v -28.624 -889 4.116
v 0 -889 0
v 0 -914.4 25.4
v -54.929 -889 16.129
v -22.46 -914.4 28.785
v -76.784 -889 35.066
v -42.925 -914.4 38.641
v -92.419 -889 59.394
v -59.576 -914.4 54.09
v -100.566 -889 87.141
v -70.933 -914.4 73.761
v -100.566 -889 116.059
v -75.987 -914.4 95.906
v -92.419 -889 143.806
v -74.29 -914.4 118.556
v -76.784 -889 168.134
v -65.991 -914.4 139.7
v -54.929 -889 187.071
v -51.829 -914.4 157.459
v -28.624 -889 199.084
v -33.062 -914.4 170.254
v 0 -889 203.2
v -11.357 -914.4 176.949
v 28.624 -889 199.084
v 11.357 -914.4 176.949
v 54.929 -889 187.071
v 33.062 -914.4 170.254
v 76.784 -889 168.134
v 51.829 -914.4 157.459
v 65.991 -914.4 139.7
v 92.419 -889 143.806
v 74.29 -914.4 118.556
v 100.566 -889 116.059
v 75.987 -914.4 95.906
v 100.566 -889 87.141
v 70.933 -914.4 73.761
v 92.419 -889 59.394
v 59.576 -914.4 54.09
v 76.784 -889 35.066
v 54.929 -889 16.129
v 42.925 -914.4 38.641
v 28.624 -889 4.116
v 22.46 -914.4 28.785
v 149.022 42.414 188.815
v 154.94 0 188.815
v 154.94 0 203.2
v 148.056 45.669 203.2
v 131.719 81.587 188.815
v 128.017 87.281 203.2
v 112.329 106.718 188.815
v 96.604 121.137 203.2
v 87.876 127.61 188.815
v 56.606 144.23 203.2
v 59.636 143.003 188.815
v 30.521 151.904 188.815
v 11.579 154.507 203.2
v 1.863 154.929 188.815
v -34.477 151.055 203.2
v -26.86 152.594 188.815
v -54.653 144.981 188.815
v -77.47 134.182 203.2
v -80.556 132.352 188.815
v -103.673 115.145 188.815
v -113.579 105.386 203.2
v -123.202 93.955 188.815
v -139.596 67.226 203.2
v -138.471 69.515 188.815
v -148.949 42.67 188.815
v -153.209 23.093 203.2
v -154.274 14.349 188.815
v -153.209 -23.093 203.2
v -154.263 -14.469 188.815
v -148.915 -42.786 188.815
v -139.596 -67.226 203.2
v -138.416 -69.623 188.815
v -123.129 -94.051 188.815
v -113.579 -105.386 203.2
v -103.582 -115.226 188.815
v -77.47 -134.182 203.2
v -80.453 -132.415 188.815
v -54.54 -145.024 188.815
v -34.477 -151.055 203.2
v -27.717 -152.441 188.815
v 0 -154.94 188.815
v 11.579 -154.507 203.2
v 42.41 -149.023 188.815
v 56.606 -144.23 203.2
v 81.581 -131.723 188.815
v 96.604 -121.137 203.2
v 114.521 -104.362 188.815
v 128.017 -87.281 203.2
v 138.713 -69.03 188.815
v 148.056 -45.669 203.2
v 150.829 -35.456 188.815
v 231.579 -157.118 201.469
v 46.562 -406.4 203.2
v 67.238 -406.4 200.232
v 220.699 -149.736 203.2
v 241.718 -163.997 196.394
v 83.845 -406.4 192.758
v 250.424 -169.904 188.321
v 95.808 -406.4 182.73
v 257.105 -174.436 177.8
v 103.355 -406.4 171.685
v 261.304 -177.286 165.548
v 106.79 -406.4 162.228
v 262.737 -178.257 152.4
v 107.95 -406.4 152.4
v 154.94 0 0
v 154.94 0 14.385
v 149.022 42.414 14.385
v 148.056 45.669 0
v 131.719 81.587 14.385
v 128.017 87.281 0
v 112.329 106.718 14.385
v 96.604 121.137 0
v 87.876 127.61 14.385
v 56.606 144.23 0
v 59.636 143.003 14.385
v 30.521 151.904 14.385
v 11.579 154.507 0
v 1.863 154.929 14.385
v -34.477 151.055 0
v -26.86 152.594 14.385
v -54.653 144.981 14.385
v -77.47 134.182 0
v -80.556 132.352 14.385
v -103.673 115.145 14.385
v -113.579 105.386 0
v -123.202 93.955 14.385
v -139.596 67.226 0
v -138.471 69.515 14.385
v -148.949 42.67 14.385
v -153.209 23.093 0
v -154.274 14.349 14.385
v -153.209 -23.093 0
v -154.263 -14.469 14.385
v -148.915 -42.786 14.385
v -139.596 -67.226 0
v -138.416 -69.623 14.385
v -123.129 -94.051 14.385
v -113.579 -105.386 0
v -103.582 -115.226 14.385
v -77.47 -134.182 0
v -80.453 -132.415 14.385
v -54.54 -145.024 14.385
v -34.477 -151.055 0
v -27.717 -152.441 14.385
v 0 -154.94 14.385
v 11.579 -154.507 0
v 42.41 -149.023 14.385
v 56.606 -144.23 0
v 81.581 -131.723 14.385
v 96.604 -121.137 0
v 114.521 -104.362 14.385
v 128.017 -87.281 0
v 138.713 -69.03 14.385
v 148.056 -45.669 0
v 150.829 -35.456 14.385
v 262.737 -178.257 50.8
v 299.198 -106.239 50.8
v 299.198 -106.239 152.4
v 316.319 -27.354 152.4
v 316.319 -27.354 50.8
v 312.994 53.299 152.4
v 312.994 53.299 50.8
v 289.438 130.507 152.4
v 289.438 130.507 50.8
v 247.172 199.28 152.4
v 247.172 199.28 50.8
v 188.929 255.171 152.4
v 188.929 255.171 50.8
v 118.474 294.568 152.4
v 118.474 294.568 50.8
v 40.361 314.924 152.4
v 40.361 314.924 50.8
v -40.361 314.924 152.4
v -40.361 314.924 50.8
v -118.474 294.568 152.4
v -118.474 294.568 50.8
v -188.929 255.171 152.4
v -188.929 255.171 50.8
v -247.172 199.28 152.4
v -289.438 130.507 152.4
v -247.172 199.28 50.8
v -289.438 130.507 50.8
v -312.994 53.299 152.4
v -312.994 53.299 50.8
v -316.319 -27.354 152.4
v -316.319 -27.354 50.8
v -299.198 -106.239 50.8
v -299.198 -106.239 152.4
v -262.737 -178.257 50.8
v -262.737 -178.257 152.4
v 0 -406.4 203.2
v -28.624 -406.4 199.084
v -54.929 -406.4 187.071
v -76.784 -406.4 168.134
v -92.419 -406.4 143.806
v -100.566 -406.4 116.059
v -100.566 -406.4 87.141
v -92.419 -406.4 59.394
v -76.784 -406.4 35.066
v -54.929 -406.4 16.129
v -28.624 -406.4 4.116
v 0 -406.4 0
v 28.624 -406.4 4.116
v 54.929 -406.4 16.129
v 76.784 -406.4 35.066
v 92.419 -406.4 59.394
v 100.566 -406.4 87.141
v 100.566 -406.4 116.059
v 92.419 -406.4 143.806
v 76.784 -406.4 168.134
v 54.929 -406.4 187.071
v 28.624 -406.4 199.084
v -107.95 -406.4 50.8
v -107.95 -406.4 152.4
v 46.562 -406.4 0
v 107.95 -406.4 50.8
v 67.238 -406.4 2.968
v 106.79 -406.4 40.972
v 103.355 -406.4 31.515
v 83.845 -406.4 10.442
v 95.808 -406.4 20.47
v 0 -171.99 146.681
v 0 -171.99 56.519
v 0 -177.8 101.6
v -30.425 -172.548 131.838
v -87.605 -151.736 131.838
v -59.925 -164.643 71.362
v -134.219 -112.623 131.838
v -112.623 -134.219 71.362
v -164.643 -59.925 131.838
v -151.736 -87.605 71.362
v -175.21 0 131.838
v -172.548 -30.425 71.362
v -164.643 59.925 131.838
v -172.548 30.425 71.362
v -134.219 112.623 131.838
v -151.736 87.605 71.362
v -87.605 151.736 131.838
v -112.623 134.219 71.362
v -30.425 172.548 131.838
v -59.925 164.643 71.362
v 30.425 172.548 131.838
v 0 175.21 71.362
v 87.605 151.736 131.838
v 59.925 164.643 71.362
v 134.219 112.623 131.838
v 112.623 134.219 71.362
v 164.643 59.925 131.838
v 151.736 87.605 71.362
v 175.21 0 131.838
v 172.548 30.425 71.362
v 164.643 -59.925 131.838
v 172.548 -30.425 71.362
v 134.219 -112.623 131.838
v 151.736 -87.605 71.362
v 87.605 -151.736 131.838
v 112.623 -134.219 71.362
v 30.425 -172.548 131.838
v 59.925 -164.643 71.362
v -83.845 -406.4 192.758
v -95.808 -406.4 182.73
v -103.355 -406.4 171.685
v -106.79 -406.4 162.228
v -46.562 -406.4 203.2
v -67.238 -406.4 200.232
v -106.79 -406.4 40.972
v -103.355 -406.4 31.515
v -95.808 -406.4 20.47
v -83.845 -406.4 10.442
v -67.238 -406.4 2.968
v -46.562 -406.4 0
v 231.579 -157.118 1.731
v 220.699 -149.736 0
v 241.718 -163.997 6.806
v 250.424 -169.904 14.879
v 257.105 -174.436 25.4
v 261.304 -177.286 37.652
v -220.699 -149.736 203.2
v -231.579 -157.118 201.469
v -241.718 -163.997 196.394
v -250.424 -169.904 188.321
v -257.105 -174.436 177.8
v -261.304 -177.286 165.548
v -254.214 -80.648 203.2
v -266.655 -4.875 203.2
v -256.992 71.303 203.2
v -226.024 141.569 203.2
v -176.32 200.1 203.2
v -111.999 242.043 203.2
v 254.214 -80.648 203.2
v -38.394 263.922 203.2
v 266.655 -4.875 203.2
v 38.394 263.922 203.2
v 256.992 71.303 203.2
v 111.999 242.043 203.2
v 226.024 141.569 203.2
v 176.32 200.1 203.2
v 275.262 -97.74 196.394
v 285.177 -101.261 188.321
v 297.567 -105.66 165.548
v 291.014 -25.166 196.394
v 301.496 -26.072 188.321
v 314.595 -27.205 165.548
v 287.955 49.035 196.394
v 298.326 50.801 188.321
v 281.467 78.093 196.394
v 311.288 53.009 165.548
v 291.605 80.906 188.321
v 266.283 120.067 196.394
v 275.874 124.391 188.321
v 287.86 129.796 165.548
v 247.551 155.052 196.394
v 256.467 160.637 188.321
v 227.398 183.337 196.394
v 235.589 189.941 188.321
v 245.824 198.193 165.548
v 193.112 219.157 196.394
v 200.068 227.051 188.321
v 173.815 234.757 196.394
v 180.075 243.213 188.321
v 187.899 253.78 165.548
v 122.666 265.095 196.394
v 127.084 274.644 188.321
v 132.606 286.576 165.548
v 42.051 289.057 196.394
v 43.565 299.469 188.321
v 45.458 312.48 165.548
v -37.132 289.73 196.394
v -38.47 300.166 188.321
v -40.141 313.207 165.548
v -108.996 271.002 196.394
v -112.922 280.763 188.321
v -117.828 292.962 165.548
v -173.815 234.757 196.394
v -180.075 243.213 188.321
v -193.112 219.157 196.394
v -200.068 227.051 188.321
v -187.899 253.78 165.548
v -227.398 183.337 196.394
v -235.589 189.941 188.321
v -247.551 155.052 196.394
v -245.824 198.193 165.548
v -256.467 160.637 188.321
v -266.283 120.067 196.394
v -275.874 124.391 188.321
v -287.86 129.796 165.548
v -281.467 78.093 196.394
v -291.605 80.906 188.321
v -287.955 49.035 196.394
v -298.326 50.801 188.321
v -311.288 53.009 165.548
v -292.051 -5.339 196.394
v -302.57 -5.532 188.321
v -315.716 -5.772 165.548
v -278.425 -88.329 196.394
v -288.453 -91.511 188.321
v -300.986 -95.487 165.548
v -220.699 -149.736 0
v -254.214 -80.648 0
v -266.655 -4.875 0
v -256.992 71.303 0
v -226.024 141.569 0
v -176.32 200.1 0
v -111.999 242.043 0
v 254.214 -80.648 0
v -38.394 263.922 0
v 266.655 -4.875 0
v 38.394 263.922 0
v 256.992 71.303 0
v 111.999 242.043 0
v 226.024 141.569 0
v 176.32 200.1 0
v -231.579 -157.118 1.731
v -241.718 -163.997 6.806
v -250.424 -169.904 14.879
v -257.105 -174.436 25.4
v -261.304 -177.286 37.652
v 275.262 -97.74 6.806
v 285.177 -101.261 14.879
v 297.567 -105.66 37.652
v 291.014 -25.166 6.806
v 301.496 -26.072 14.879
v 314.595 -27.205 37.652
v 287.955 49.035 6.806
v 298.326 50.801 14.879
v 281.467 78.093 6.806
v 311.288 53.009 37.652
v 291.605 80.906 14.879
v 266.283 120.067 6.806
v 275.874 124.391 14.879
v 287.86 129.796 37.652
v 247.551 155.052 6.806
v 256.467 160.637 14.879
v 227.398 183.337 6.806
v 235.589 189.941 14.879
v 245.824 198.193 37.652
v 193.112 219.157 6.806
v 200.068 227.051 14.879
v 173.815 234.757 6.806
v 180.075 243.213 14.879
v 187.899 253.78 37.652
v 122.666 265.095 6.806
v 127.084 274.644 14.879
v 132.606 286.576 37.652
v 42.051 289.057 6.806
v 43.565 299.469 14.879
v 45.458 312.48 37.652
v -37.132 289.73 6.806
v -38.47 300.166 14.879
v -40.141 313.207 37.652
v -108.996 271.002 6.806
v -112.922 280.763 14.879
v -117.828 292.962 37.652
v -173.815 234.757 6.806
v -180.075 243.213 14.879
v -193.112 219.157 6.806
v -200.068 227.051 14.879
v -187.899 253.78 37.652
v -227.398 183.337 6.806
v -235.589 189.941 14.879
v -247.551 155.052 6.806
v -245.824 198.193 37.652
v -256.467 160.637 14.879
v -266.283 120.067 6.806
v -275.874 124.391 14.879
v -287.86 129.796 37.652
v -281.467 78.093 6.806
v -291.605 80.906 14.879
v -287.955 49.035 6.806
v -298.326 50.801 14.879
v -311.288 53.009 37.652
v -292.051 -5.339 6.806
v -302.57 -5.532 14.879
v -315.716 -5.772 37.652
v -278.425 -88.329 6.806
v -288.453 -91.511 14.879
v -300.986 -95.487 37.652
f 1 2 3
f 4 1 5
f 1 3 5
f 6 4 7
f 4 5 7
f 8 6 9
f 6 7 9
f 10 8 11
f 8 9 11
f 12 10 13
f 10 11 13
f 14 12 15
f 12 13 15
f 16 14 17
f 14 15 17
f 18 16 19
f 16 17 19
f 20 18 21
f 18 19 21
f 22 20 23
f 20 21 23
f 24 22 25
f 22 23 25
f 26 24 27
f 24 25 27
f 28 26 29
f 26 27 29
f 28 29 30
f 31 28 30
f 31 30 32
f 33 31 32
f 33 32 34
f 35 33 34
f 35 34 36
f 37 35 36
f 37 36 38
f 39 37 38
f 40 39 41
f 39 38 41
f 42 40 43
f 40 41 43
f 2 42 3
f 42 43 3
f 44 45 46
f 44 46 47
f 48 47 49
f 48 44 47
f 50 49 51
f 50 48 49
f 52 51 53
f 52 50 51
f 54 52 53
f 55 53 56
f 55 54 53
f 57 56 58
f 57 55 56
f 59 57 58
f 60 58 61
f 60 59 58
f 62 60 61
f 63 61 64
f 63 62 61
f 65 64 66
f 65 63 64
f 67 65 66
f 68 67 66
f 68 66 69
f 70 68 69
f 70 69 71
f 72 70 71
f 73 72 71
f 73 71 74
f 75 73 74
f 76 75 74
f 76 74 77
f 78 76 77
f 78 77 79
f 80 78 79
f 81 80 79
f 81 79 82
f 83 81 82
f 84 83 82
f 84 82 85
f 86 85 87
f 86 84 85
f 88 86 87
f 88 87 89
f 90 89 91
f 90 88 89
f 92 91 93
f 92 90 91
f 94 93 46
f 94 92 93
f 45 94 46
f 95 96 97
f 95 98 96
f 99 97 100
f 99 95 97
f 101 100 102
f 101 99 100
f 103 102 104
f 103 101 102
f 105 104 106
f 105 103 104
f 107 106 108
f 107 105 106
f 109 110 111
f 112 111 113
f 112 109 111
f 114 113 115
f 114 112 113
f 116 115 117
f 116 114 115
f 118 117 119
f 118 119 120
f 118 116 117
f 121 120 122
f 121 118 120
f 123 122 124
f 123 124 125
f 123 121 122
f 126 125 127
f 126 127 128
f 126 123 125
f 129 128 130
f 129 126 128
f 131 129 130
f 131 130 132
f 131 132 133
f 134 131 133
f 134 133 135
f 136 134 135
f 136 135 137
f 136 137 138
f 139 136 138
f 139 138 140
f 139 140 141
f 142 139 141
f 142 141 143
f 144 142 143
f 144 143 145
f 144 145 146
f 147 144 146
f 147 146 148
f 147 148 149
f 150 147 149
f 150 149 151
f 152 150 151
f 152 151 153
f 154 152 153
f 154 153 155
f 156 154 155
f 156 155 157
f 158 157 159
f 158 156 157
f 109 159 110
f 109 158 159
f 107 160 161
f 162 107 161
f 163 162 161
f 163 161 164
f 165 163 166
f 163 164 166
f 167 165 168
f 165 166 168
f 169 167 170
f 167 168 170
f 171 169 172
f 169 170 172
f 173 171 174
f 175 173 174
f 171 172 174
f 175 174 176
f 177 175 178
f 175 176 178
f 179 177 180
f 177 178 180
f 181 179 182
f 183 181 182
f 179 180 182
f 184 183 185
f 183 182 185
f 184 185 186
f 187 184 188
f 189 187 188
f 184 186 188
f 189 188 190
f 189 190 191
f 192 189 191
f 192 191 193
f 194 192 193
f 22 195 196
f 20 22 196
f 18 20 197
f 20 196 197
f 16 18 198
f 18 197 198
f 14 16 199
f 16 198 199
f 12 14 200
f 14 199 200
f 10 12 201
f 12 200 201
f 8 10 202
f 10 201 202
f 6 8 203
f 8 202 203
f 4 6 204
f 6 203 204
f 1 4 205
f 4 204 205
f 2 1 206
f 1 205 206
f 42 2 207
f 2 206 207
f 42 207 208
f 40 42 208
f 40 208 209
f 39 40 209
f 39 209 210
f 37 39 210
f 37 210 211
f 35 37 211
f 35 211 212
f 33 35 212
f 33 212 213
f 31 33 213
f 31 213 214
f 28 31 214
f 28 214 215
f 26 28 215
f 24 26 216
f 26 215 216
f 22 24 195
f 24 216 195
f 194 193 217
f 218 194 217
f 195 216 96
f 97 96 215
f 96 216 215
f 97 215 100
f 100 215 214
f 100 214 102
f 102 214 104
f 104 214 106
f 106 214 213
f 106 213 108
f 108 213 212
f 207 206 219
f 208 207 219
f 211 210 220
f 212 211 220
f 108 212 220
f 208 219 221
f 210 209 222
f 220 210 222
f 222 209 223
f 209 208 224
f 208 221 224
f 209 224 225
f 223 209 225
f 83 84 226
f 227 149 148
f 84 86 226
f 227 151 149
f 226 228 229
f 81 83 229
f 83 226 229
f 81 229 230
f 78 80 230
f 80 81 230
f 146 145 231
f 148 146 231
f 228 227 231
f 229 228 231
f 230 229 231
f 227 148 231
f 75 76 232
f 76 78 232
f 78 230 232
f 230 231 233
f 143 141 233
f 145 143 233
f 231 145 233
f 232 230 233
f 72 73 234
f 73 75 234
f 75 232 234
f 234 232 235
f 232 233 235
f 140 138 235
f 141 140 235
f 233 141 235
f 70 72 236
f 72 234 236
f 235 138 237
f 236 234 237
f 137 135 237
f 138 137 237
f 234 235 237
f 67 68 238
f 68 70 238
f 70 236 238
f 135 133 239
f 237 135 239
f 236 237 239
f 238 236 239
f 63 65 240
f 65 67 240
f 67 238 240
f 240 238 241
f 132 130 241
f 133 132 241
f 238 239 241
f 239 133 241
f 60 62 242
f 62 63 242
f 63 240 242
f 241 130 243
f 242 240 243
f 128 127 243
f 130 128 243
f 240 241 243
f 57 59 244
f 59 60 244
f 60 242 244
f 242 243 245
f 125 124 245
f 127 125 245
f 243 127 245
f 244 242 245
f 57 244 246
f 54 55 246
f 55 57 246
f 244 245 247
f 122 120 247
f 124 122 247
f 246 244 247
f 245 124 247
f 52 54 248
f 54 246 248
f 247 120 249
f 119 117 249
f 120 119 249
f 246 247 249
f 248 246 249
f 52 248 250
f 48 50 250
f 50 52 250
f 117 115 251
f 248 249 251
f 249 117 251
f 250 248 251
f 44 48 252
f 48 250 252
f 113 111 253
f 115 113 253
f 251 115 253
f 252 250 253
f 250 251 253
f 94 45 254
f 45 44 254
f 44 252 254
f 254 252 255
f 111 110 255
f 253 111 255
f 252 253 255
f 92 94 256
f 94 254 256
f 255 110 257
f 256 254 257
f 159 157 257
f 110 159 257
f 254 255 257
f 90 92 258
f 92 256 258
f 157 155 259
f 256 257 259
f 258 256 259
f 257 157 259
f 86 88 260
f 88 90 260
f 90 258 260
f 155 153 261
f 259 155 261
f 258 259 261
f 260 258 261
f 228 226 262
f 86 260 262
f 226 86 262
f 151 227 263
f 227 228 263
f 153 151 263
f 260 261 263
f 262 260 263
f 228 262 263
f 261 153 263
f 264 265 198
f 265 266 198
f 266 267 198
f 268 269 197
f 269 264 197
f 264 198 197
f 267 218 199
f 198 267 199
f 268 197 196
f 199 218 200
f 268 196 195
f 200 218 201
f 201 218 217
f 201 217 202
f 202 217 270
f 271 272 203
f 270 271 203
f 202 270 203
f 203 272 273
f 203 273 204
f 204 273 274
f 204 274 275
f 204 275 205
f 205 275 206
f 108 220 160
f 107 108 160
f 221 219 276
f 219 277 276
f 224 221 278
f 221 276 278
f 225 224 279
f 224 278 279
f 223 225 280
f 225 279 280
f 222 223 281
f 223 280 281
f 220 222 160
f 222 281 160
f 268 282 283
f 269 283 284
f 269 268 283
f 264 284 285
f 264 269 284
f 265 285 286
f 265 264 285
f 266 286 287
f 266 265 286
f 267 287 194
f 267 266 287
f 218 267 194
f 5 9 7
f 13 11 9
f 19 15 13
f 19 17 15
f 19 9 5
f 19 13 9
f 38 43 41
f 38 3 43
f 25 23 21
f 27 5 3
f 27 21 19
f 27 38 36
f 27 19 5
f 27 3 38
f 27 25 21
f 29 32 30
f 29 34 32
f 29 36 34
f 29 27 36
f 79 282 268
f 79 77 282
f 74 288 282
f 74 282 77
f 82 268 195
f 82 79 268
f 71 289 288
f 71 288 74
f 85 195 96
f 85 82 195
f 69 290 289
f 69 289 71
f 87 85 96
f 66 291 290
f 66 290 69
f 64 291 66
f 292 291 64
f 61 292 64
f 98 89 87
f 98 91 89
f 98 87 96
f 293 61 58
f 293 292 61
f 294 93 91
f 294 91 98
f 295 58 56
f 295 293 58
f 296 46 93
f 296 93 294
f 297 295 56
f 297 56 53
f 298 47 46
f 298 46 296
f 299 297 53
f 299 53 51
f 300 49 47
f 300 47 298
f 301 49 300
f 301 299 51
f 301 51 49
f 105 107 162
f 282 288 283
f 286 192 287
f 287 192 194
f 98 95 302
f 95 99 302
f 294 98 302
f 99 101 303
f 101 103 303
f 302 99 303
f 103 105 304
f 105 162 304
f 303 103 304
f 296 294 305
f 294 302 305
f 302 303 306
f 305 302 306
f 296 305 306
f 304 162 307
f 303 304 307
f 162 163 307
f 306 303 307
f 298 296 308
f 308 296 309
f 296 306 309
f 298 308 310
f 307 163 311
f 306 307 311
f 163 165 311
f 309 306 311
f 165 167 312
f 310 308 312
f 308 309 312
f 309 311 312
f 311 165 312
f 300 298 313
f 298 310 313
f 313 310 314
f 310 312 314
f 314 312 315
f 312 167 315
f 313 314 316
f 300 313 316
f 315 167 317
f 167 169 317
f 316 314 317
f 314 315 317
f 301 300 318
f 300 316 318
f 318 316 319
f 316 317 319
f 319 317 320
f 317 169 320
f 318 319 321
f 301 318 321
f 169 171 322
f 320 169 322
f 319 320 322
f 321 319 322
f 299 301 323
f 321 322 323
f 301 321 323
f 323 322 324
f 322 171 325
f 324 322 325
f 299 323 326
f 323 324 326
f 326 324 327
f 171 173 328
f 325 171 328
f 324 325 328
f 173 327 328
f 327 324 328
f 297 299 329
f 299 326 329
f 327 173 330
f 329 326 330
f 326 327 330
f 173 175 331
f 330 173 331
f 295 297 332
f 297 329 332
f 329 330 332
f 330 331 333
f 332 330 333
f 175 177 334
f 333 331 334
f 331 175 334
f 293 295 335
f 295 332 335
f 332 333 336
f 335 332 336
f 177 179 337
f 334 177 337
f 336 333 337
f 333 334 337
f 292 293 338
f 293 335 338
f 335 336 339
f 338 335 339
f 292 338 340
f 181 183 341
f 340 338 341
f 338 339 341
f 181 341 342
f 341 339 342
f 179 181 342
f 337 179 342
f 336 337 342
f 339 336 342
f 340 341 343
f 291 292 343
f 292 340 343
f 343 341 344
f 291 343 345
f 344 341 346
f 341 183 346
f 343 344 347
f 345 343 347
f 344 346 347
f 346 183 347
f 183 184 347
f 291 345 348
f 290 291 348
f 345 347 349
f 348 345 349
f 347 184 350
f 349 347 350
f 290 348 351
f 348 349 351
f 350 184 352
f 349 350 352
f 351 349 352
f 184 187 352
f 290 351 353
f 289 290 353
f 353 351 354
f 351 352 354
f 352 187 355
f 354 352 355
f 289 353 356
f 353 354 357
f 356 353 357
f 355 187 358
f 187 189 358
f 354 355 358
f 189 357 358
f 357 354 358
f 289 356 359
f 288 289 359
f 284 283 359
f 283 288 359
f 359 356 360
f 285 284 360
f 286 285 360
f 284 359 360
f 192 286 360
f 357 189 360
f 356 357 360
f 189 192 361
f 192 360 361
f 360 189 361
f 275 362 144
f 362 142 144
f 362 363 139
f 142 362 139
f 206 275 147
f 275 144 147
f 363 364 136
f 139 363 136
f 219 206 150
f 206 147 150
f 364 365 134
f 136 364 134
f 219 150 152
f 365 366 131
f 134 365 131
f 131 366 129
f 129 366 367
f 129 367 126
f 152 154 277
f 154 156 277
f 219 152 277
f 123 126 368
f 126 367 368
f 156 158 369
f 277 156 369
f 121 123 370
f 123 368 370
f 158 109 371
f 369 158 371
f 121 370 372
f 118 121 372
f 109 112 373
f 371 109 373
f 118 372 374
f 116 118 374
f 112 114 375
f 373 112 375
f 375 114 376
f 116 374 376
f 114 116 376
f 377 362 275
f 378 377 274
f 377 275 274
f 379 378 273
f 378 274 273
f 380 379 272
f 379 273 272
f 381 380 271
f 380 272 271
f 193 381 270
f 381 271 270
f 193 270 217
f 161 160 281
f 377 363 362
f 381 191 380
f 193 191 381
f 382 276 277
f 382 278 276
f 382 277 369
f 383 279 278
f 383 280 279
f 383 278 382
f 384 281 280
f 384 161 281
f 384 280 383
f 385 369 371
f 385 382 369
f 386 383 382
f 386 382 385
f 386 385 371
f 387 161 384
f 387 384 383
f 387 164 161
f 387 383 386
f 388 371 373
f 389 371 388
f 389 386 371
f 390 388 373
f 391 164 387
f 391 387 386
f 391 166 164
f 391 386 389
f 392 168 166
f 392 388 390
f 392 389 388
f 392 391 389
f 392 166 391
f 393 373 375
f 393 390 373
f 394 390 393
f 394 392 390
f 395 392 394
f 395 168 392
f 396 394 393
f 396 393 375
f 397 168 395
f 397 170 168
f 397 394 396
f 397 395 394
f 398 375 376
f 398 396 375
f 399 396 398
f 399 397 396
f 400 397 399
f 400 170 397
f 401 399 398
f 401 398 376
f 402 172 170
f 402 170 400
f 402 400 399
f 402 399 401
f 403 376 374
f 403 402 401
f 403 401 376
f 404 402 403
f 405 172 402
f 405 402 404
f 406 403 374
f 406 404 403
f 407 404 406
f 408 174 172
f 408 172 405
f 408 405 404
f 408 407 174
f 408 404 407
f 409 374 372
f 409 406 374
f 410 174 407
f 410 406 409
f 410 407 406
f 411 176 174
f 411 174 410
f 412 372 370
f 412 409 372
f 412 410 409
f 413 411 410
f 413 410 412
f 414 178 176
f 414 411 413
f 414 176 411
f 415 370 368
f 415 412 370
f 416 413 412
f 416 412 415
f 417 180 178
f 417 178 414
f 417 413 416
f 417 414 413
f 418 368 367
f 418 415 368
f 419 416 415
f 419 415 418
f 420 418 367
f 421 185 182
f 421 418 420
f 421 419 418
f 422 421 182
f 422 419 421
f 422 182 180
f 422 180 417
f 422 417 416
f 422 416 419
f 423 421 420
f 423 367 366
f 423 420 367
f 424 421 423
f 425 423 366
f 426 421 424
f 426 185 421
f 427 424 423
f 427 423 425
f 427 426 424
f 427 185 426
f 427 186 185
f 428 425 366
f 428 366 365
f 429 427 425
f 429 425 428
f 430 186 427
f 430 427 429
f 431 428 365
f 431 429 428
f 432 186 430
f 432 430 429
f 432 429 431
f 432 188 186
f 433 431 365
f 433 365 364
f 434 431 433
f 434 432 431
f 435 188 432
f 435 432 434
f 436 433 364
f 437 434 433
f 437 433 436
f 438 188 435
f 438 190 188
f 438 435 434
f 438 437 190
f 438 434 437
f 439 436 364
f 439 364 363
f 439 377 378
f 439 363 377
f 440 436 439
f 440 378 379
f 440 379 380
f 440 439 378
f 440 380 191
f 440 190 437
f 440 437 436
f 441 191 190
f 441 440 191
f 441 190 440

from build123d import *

# Parameters (mm, degrees)
F0_R     = 154.94
F1_DEPTH = 203.2
F3_DEPTH = 508
F6_R     = 50.8


# Not quite as in the source:
# - a fillet or chamfer that OpenCascade refuses, or shapes differently, is made with other operations: its cross-section is extruded or revolved along the edge and cut away or added


with BuildPart() as f1:
    # F0 (on Top) → F1 (new body)
    with BuildSketch(Plane.XY):
        with BuildLine():
            Line((107.95, -406.4), (262.736611536, -178.2574625608))
            ThreePointArc((262.736611536, -178.2574625608), (0, 317.5), (-262.736611536, -178.2574625608))
            Line((-262.736611536, -178.2574625608), (-107.95, -406.4))
            Line((-107.95, -406.4), (0, -406.4))
            Line((0, -406.4), (107.95, -406.4))
        make_face()
        Circle(F0_R, mode=Mode.SUBTRACT)
    extrude(amount=F1_DEPTH)

    # F2 (on face) → F3 (join)
    with BuildSketch(Plane.XZ.offset(406.4)):
        with BuildLine():
            ThreePointArc((-6.5e-08, 0), (71.8420489456, 29.7579510085), (101.6, 101.6))
            ThreePointArc((101.6, 101.6), (71.8420489961, 173.442048941), (7.8e-08, 203.2))
            ThreePointArc((7.8e-08, 203.2), (-101.6, 101.6000000715), (-6.5e-08, 0))
        make_face()
    extrude(amount=F3_DEPTH)

    # F4 (on Right) → F5 (revolve, cut)
    with BuildSketch(Plane.YZ):
        with BuildLine():
            Line((0, 203.2), (-145.9118912221, 203.2))
            ThreePointArc((-145.9118912221, 203.2), (-177.8, 101.6), (-145.9118912221, 0))
            Line((-145.9118912221, 0), (0, 0))
            Line((0, 0), (0, 203.2))
        make_face()
    revolve(axis=Axis((0, 0, 101.6), (0, 0, -1)), mode=Mode.SUBTRACT)

    # F6
    f6_edges = [f1.edges().sort_by_distance(p)[0] for p in [
        (262.736612, -178.257463, 101.6),
        (-262.736612, -178.257463, 101.6),
        (0, 317.5, 0),
        (0, 317.5, 203.2),
        (-185.343306, -292.328731, 0),
        (-185.343306, -292.328731, 203.2),
        (185.343306, -292.328731, 0),
        (185.343306, -292.328731, 203.2),
    ]]
    fillet(f6_edges, radius=F6_R)

    # F7: chamfer of 25.4 on 1 edges, made by hand

    # F7_s1 → F7_t2 (revolve, cut)
    with BuildSketch(Plane.YZ):
        Polygon((-889, 0), (-914.4, 25.4), (-914.4, 0), align=None)
    revolve(axis=Axis((0, -914.4, 101.6), (0, 1, 0)), mode=Mode.SUBTRACT)


solid = f1.part
